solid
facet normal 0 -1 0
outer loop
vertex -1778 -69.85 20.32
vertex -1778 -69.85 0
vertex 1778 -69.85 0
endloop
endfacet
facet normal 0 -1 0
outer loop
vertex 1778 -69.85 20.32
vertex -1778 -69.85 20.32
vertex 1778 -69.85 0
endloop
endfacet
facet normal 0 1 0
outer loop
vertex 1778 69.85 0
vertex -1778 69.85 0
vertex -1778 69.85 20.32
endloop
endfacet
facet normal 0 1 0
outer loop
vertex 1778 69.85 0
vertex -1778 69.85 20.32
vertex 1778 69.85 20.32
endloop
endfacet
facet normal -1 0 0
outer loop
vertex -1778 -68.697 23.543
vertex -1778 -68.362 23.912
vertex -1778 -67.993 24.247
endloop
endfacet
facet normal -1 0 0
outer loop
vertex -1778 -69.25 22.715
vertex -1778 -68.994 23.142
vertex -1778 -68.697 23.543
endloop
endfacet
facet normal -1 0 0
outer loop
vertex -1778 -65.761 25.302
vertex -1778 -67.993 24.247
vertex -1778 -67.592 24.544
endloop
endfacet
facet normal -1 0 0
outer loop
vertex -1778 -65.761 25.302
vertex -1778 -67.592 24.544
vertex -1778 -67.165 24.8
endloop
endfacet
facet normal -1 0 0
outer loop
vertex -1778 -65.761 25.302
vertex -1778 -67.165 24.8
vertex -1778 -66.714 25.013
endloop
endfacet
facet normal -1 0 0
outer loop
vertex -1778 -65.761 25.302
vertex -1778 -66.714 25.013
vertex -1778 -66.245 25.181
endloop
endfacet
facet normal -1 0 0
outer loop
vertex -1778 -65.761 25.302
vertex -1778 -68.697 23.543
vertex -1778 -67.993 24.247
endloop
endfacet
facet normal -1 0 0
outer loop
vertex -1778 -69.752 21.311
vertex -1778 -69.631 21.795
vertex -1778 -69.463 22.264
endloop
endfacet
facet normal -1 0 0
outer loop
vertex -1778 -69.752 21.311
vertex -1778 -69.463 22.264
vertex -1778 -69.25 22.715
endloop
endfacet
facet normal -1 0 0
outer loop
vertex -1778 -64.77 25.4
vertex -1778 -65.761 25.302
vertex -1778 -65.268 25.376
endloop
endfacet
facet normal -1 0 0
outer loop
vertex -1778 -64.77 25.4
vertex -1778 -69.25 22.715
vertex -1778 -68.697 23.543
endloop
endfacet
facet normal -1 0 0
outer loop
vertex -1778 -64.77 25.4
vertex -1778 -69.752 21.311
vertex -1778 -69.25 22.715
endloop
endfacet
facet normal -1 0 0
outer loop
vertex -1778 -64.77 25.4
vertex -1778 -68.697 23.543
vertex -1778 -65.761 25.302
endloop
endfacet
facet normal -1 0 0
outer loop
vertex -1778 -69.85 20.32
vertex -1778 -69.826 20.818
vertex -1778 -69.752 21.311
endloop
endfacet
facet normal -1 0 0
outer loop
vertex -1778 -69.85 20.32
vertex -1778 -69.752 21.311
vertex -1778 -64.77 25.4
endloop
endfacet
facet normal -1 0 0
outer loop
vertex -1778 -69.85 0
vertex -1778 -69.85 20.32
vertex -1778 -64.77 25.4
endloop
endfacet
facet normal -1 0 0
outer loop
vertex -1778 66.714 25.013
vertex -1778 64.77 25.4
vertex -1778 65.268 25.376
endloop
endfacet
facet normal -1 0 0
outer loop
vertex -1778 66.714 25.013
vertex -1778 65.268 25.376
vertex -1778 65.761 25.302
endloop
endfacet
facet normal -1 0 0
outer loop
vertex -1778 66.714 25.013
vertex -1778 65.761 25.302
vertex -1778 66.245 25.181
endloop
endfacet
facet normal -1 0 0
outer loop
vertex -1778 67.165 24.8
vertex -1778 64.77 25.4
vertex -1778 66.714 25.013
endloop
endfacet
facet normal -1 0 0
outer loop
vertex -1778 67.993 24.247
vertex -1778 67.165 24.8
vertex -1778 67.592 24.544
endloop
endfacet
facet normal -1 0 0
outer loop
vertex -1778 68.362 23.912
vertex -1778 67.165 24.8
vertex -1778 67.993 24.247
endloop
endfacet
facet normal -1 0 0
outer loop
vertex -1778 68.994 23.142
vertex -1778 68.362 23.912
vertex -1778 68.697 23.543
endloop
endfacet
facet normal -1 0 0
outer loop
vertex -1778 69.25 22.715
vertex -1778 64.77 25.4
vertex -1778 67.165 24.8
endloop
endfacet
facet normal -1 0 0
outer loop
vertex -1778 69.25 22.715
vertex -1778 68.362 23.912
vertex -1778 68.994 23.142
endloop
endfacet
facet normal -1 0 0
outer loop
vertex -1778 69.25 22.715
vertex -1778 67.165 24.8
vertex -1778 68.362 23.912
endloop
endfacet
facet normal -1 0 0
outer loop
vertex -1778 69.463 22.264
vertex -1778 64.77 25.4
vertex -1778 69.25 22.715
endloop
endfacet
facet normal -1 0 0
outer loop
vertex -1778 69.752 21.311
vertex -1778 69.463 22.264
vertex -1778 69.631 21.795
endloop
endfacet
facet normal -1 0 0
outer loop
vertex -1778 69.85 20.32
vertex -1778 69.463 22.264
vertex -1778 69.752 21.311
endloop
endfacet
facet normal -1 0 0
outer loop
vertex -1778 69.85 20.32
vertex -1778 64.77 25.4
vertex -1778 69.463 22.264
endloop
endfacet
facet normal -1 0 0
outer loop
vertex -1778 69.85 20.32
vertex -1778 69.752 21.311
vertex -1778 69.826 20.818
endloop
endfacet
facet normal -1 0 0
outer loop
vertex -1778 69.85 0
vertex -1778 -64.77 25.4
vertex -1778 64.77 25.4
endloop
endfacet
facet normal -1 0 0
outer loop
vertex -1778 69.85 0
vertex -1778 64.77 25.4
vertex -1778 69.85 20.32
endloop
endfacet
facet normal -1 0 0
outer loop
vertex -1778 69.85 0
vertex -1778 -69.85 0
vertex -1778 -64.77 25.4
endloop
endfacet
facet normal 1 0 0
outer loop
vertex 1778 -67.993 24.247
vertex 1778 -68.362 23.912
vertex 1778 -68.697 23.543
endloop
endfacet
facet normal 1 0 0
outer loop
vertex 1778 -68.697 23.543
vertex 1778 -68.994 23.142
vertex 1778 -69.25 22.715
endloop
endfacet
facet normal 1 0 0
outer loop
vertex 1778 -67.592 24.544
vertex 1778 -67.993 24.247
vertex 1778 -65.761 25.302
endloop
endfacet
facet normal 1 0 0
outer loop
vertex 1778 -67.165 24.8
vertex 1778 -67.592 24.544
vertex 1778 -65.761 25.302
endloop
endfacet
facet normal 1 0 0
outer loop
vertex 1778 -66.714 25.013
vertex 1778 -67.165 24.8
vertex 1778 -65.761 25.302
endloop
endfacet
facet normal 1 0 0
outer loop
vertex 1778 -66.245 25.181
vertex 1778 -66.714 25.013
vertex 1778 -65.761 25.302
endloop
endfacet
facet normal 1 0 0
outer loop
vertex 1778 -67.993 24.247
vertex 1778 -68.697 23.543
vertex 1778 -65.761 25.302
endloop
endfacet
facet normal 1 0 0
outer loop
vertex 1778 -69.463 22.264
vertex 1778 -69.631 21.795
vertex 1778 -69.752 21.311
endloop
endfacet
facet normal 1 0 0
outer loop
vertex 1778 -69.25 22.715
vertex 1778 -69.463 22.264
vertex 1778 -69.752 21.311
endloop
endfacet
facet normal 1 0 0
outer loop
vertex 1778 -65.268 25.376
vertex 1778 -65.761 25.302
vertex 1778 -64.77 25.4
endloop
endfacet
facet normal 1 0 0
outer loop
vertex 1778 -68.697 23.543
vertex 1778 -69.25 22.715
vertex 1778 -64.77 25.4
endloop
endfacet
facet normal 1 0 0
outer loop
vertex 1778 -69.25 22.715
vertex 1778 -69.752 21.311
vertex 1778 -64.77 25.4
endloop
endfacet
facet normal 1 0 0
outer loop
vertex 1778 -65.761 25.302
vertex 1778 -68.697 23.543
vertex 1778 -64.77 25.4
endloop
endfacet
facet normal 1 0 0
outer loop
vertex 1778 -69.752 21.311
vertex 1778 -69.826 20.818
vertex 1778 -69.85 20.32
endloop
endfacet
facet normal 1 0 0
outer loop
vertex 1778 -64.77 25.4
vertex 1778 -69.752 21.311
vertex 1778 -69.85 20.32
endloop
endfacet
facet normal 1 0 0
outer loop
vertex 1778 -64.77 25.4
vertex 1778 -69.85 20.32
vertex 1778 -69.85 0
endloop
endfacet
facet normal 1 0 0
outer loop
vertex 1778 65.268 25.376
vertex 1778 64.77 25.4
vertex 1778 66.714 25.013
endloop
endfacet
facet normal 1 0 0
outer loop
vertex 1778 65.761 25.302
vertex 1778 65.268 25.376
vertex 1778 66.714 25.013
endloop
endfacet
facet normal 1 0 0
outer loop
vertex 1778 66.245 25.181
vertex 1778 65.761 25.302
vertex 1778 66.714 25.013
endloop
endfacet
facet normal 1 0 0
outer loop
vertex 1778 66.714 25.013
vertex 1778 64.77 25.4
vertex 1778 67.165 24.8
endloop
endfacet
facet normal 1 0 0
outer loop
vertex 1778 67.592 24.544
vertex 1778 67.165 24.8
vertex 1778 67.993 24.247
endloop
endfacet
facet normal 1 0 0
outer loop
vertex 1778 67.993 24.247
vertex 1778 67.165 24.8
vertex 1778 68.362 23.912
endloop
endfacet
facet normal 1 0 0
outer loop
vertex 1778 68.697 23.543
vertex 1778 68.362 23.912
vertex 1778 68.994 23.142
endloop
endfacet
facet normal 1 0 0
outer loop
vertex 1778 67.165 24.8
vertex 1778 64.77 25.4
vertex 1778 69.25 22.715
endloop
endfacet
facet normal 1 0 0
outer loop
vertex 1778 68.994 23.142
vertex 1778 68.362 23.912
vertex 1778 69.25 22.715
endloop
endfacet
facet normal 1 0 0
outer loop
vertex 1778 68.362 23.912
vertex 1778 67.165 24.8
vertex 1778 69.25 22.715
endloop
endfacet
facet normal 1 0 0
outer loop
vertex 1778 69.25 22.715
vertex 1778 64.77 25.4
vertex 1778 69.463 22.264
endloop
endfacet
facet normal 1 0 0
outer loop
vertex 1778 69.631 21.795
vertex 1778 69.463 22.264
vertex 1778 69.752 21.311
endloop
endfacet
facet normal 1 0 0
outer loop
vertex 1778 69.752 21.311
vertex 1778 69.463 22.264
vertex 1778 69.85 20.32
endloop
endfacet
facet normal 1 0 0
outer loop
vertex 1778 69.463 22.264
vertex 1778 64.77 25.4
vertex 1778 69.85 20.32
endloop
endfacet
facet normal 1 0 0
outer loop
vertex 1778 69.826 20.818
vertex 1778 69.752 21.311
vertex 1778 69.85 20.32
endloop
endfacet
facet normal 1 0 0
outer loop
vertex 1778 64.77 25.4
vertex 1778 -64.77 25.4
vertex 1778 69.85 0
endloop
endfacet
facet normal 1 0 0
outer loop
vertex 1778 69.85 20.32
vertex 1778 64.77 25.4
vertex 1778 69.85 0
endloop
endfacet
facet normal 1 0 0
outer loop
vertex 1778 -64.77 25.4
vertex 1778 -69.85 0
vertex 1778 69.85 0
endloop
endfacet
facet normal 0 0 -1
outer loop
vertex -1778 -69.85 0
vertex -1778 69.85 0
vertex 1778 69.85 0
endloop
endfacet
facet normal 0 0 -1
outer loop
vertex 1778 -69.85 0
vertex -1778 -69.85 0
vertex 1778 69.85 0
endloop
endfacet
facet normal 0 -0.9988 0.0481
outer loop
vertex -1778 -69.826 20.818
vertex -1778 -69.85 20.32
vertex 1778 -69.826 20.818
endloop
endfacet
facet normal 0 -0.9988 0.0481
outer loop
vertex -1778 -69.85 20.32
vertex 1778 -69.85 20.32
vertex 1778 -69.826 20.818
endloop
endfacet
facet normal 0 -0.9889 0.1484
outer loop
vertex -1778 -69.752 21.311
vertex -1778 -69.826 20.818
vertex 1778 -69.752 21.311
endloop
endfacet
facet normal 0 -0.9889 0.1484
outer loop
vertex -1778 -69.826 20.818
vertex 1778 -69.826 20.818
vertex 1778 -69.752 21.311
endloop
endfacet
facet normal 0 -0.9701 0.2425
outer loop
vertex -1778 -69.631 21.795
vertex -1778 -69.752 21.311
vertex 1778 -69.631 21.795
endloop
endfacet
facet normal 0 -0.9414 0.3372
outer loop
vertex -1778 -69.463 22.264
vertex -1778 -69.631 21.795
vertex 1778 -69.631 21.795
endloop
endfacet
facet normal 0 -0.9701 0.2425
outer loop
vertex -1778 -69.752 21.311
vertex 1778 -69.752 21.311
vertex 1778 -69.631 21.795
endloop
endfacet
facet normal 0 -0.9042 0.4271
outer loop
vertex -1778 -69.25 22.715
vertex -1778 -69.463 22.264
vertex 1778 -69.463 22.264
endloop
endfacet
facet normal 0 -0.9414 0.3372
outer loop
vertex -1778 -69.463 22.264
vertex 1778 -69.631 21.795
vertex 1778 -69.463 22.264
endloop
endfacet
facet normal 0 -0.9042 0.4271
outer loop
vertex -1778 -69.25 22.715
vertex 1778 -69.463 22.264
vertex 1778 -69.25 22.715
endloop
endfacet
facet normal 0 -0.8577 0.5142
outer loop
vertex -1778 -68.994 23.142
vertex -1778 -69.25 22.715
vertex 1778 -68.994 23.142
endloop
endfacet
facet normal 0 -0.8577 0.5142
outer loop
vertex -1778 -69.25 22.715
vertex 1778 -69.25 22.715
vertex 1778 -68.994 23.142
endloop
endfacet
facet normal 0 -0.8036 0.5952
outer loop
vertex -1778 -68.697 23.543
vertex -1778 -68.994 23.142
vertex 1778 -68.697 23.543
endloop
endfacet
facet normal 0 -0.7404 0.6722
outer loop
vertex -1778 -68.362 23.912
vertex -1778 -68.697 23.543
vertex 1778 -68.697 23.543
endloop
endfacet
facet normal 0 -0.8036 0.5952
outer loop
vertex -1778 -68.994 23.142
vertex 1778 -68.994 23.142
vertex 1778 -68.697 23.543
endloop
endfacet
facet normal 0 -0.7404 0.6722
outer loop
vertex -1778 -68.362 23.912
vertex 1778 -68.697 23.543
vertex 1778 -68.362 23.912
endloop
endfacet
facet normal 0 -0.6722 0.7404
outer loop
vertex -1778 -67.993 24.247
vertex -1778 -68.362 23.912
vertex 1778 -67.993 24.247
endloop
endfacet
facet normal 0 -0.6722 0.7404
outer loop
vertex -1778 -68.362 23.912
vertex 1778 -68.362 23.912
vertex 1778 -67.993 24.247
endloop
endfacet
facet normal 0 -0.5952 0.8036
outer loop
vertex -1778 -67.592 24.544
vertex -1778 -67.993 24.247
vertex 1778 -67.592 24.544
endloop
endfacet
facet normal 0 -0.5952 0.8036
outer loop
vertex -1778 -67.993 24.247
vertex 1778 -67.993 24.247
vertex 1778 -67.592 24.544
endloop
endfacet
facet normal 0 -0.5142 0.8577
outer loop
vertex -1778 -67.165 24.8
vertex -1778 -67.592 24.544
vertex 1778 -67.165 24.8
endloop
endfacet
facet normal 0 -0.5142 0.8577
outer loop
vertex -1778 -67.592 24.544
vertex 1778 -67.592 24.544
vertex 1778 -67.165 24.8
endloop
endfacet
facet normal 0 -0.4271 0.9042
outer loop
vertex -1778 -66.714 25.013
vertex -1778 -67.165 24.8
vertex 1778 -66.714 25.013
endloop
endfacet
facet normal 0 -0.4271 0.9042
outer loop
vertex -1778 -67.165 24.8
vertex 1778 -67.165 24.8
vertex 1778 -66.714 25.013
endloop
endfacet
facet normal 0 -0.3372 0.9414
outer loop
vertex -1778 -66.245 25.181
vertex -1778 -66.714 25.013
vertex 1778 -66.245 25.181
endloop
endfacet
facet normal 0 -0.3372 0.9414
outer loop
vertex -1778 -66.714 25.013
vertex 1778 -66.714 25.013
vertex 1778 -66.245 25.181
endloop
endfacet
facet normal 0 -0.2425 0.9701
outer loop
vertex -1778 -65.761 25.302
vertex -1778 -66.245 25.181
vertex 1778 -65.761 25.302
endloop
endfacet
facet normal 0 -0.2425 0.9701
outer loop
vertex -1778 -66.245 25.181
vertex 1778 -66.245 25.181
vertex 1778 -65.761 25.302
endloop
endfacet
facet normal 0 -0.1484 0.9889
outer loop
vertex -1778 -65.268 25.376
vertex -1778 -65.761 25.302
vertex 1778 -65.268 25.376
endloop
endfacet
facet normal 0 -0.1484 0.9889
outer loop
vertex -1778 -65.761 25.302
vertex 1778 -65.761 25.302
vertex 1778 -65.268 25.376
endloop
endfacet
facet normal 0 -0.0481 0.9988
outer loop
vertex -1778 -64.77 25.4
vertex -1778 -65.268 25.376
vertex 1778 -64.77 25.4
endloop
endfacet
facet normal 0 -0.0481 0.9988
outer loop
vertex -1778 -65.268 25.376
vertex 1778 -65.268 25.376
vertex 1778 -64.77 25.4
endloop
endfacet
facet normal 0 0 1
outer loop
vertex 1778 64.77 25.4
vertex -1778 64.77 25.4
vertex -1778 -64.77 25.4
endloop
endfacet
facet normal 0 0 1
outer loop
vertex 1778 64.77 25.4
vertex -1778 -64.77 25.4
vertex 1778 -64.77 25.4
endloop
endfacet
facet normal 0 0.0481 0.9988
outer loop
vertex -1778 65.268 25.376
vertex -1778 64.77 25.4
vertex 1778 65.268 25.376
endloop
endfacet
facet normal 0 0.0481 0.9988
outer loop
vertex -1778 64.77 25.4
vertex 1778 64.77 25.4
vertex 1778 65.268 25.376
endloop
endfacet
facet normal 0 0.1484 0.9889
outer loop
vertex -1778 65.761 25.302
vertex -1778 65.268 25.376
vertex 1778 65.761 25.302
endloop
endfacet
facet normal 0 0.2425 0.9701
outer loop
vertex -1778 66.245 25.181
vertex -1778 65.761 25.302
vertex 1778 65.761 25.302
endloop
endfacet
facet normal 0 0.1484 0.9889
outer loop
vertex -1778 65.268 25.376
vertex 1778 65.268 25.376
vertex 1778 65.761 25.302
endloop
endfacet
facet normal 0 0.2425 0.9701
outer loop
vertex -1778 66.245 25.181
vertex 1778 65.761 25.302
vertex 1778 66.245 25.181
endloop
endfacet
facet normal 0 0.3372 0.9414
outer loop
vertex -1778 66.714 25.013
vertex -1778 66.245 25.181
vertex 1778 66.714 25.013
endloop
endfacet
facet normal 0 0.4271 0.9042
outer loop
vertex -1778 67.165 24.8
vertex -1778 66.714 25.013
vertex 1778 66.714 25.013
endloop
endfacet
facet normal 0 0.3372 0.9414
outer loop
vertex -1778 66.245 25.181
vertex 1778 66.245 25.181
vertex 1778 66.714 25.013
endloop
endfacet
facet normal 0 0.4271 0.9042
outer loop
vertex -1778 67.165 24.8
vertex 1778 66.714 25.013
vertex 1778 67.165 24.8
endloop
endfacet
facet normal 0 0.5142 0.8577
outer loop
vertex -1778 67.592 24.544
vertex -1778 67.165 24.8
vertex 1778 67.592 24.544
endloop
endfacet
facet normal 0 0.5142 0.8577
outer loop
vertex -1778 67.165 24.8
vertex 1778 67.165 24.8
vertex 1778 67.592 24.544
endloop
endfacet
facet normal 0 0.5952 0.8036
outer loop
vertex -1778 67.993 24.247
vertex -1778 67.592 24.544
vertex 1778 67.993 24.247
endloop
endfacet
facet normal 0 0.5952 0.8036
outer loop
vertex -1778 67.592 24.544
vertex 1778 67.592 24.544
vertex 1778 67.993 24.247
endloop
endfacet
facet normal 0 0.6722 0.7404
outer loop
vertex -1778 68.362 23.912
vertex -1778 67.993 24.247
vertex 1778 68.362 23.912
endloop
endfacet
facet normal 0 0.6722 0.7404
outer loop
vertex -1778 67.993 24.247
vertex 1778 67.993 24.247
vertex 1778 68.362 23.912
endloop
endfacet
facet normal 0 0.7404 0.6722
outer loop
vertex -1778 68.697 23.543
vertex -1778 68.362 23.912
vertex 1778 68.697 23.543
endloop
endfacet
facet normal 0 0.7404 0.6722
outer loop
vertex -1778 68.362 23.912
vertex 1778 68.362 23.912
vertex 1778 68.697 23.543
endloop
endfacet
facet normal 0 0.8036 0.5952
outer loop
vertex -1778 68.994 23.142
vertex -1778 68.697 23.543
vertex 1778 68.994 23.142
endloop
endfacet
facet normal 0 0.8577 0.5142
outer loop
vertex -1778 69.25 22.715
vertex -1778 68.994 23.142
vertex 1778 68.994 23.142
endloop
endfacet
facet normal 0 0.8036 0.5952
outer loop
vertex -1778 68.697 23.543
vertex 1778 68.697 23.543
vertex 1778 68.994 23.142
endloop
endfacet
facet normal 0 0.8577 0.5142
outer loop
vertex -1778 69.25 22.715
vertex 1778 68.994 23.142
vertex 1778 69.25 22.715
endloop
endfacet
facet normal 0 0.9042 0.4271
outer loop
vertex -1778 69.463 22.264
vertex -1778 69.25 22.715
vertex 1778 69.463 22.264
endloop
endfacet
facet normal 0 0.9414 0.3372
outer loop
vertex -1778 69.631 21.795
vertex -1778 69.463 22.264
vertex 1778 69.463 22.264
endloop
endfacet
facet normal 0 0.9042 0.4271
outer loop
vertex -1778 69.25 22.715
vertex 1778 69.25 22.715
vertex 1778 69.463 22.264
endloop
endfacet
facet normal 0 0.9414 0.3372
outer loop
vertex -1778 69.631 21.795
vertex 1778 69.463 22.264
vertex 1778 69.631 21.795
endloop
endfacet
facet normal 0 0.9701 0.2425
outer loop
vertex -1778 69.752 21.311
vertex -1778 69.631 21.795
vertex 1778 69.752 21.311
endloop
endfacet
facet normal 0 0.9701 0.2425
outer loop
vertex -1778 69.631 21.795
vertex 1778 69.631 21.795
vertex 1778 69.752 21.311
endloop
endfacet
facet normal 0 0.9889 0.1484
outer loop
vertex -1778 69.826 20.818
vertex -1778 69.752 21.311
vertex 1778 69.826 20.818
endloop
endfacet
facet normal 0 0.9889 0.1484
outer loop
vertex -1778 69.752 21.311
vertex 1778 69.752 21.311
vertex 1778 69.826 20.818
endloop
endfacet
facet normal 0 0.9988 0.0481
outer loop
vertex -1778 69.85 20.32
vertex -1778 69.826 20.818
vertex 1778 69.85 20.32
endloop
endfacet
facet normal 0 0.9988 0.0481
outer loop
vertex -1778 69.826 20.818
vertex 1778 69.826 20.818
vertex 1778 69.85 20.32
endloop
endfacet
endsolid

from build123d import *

# Parameters (mm, degrees)
F0_W     = 3556
F0_H     = 139.7
F1_DEPTH = 25.4
F2_R     = 5.08
F3_R     = 5.08


with BuildPart() as f1:
    # F0 (on Top) → F1 (new body)
    with BuildSketch(Plane.XY):
        Rectangle(F0_W, F0_H)
    extrude(amount=F1_DEPTH)

    # F2
    f2_edges = [f1.edges().sort_by_distance(p)[0] for p in [
        (0, -69.85, 25.4),
    ]]
    fillet(f2_edges, radius=F2_R)

    # F3
    f3_edges = [f1.edges().sort_by_distance(p)[0] for p in [
        (0, 69.85, 25.4),
    ]]
    fillet(f3_edges, radius=F3_R)


solid = f1.part
